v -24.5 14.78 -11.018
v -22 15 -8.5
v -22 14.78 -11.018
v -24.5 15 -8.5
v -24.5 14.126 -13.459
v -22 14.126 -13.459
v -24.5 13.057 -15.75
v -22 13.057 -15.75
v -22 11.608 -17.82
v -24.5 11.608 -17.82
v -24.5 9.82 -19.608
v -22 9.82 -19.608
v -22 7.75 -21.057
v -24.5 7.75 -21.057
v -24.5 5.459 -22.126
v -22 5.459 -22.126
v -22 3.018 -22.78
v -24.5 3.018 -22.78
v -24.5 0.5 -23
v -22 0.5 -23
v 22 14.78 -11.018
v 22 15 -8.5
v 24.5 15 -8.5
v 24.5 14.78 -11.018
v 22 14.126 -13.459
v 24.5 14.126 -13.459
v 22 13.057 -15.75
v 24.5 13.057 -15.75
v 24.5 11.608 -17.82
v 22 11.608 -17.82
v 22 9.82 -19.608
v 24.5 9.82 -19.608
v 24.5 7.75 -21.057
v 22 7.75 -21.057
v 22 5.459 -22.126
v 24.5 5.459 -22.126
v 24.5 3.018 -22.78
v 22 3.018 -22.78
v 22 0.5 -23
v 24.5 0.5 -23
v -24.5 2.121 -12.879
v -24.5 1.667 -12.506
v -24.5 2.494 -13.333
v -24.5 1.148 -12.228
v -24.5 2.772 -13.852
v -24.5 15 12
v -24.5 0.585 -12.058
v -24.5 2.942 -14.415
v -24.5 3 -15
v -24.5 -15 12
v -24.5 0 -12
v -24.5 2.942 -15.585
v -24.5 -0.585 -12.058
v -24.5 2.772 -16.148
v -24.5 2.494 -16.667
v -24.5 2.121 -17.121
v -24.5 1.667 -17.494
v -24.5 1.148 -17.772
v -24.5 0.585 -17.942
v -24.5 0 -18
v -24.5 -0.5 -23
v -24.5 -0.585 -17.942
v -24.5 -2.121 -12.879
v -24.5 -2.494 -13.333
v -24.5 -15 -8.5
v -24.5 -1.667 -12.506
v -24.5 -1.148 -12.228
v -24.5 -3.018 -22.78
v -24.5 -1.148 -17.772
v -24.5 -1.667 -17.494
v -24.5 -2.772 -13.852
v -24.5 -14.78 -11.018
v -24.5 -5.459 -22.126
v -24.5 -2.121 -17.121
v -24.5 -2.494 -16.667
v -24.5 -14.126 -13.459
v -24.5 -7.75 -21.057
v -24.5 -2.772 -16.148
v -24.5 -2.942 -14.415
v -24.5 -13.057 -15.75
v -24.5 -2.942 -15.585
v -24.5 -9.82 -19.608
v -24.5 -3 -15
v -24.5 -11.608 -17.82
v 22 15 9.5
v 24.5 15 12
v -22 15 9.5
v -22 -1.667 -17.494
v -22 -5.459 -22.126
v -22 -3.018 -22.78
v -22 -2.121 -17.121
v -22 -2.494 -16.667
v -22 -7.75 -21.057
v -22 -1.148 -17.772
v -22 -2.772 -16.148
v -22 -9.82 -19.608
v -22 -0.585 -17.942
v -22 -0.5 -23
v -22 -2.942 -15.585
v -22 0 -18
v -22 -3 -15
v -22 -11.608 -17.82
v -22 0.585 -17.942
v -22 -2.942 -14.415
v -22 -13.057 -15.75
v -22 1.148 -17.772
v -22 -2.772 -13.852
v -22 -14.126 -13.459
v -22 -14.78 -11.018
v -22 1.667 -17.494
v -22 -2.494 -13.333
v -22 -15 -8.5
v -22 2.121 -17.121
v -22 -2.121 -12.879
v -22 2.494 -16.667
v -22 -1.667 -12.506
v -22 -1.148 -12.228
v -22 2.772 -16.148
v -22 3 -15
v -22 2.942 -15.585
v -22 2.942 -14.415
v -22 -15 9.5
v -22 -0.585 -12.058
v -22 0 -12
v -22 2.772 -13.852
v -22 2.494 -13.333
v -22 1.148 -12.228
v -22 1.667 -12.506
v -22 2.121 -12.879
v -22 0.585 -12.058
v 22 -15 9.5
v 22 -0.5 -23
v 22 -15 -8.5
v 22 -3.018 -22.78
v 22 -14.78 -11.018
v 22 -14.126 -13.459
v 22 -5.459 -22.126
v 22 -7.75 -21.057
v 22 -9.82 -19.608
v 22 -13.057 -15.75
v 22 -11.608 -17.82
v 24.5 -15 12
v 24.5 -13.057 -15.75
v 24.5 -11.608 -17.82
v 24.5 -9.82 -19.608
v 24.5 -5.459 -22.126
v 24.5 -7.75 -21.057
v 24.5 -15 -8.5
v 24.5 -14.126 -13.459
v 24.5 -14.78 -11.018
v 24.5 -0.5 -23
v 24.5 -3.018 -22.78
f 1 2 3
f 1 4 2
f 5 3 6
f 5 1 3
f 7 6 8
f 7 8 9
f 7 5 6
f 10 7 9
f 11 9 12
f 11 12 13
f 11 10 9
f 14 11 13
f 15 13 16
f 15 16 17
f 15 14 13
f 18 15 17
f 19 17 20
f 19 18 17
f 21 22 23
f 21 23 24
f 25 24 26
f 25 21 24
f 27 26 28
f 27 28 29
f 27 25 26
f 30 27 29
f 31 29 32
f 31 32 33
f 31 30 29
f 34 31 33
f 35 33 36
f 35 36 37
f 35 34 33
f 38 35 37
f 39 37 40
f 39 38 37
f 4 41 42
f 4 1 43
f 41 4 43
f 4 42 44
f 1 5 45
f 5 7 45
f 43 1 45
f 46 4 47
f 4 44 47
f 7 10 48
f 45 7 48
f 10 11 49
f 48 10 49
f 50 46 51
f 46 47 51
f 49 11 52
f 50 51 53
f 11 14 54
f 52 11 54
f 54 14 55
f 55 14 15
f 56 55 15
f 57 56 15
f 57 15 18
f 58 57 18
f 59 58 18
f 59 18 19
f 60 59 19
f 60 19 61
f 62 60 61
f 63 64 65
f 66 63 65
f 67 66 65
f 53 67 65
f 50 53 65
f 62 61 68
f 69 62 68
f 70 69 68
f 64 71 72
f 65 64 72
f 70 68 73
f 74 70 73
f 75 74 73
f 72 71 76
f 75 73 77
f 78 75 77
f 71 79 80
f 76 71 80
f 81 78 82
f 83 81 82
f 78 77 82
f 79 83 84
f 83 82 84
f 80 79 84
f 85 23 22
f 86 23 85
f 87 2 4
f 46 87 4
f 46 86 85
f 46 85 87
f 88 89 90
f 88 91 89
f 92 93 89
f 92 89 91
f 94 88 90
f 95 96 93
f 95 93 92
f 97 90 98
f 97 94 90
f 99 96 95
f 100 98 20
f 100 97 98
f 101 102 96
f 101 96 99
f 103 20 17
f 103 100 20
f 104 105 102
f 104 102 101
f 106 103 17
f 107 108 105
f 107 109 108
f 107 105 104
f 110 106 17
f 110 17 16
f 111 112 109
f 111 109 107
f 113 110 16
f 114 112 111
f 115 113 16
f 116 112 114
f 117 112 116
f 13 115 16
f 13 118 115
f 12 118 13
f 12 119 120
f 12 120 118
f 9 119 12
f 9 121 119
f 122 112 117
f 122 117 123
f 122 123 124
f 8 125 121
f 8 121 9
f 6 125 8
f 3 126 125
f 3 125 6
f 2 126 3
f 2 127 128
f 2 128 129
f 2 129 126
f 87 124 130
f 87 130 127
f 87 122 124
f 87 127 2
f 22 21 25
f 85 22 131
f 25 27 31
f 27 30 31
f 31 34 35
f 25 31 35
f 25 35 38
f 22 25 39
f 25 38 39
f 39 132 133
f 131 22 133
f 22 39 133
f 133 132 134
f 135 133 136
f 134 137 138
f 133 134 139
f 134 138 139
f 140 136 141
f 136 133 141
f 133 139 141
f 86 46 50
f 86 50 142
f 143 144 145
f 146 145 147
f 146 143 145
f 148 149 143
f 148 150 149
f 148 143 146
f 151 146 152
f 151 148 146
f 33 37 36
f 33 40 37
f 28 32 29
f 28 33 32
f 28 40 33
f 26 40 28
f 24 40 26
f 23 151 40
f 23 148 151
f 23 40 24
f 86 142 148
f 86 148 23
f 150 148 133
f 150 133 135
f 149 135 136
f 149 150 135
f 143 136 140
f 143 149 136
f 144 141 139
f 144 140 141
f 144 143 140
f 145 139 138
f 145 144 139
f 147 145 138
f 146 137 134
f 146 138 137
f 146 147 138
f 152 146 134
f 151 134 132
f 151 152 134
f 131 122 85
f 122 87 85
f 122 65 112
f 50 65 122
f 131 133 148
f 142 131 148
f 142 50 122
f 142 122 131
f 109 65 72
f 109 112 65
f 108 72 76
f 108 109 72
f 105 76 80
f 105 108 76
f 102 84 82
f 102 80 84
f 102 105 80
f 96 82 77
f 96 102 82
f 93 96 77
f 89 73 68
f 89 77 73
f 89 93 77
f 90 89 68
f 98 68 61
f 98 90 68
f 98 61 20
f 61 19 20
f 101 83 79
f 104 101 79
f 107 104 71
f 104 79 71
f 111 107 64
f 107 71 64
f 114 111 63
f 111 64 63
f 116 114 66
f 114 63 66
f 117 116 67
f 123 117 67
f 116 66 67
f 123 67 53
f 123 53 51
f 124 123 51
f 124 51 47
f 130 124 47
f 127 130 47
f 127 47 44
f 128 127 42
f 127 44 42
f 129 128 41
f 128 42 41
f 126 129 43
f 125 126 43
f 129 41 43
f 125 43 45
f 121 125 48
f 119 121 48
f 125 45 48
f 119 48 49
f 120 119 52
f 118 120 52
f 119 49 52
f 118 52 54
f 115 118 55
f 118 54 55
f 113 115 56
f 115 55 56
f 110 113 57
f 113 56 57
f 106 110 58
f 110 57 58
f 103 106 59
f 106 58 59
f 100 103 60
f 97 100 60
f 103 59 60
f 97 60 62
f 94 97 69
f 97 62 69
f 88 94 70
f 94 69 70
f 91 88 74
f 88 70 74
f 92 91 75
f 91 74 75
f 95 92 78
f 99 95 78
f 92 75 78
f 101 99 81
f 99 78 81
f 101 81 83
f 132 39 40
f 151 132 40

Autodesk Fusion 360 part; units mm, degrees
sketch "Sketch1" plane through (0, 0, 0) normal (0, 0, 1) x (1, 0, 0)
  line L0 (-22, 15) -> (22, 15)
  line L1 (22, 15) -> (22, -15)
  line L2 (22, -15) -> (-22, -15)
  line L3 (-22, -15) -> (-22, 15)
  line L4 (-22, 15) -> (22, -15) construction
  line L5 (22, 15) -> (-22, -15) construction
  line L6 (24.5, 15) -> (22, 15)
  line L7 (22, 15) -> (22, -15)
  line L8 (22, -15) -> (24.5, -15)
  line L9 (24.5, -15) -> (24.5, 15)
  line L10 (-24.5, -15) -> (-22, -15)
  line L11 (-22, -15) -> (-22, 15)
  line L12 (-22, 15) -> (-24.5, 15)
  line L13 (-24.5, 15) -> (-24.5, -15)
  dimension "d1" = 44
  dimension "d2" = 30
  dimension "d8" = 2.5
  dimension "d9" = 2.5
extrude "Extrude1" add sketch "Sketch1" against normal blind 23 contours L3 L10 L11 L12 L13 | L1 L6 L7 L8 L9 makes body 1 at (24.5, -5, -7.6667) makes body 2 at (-22, -5, -7.6667)
extrude "Extrude2" add sketch "Sketch1" along normal blind 12 bodies 1 2
sketch "Sketch2" plane through (-24.5, 0, 0) normal (-1, 0, 0) x (0, -1, 0)
  line L0 (-15, 12) -> (-15, -23)
  line L1 (-15, -23) -> (15, -23)
  line L2 (15, -23) -> (15, 12)
  line L3 (15, 12) -> (-15, 12)
  circle A0 centre (0, -15) radius 3
  dimension "d10" = 6
extrude "Extrude3" cut sketch "Sketch2" against normal blind 24 contours A0 bodies 1
fillet "Fillet1" radius 14.5 4 edges at (-23.25, -15, -23) (-23.25, 15, -23) (23.25, 15, -23) (23.25, -15, -23) on bodies 1
extrude "Extrude4" cut 1 faces at (-7.3333, 5, 0) along direction (0, 0, 1) blind 9 on bodies 1 bodies 1
extrude "Extrude5" cut 1 faces at (-7.3333, 5, 9) along direction (0, 0, 1) blind 0.5 on bodies 1 bodies 1
